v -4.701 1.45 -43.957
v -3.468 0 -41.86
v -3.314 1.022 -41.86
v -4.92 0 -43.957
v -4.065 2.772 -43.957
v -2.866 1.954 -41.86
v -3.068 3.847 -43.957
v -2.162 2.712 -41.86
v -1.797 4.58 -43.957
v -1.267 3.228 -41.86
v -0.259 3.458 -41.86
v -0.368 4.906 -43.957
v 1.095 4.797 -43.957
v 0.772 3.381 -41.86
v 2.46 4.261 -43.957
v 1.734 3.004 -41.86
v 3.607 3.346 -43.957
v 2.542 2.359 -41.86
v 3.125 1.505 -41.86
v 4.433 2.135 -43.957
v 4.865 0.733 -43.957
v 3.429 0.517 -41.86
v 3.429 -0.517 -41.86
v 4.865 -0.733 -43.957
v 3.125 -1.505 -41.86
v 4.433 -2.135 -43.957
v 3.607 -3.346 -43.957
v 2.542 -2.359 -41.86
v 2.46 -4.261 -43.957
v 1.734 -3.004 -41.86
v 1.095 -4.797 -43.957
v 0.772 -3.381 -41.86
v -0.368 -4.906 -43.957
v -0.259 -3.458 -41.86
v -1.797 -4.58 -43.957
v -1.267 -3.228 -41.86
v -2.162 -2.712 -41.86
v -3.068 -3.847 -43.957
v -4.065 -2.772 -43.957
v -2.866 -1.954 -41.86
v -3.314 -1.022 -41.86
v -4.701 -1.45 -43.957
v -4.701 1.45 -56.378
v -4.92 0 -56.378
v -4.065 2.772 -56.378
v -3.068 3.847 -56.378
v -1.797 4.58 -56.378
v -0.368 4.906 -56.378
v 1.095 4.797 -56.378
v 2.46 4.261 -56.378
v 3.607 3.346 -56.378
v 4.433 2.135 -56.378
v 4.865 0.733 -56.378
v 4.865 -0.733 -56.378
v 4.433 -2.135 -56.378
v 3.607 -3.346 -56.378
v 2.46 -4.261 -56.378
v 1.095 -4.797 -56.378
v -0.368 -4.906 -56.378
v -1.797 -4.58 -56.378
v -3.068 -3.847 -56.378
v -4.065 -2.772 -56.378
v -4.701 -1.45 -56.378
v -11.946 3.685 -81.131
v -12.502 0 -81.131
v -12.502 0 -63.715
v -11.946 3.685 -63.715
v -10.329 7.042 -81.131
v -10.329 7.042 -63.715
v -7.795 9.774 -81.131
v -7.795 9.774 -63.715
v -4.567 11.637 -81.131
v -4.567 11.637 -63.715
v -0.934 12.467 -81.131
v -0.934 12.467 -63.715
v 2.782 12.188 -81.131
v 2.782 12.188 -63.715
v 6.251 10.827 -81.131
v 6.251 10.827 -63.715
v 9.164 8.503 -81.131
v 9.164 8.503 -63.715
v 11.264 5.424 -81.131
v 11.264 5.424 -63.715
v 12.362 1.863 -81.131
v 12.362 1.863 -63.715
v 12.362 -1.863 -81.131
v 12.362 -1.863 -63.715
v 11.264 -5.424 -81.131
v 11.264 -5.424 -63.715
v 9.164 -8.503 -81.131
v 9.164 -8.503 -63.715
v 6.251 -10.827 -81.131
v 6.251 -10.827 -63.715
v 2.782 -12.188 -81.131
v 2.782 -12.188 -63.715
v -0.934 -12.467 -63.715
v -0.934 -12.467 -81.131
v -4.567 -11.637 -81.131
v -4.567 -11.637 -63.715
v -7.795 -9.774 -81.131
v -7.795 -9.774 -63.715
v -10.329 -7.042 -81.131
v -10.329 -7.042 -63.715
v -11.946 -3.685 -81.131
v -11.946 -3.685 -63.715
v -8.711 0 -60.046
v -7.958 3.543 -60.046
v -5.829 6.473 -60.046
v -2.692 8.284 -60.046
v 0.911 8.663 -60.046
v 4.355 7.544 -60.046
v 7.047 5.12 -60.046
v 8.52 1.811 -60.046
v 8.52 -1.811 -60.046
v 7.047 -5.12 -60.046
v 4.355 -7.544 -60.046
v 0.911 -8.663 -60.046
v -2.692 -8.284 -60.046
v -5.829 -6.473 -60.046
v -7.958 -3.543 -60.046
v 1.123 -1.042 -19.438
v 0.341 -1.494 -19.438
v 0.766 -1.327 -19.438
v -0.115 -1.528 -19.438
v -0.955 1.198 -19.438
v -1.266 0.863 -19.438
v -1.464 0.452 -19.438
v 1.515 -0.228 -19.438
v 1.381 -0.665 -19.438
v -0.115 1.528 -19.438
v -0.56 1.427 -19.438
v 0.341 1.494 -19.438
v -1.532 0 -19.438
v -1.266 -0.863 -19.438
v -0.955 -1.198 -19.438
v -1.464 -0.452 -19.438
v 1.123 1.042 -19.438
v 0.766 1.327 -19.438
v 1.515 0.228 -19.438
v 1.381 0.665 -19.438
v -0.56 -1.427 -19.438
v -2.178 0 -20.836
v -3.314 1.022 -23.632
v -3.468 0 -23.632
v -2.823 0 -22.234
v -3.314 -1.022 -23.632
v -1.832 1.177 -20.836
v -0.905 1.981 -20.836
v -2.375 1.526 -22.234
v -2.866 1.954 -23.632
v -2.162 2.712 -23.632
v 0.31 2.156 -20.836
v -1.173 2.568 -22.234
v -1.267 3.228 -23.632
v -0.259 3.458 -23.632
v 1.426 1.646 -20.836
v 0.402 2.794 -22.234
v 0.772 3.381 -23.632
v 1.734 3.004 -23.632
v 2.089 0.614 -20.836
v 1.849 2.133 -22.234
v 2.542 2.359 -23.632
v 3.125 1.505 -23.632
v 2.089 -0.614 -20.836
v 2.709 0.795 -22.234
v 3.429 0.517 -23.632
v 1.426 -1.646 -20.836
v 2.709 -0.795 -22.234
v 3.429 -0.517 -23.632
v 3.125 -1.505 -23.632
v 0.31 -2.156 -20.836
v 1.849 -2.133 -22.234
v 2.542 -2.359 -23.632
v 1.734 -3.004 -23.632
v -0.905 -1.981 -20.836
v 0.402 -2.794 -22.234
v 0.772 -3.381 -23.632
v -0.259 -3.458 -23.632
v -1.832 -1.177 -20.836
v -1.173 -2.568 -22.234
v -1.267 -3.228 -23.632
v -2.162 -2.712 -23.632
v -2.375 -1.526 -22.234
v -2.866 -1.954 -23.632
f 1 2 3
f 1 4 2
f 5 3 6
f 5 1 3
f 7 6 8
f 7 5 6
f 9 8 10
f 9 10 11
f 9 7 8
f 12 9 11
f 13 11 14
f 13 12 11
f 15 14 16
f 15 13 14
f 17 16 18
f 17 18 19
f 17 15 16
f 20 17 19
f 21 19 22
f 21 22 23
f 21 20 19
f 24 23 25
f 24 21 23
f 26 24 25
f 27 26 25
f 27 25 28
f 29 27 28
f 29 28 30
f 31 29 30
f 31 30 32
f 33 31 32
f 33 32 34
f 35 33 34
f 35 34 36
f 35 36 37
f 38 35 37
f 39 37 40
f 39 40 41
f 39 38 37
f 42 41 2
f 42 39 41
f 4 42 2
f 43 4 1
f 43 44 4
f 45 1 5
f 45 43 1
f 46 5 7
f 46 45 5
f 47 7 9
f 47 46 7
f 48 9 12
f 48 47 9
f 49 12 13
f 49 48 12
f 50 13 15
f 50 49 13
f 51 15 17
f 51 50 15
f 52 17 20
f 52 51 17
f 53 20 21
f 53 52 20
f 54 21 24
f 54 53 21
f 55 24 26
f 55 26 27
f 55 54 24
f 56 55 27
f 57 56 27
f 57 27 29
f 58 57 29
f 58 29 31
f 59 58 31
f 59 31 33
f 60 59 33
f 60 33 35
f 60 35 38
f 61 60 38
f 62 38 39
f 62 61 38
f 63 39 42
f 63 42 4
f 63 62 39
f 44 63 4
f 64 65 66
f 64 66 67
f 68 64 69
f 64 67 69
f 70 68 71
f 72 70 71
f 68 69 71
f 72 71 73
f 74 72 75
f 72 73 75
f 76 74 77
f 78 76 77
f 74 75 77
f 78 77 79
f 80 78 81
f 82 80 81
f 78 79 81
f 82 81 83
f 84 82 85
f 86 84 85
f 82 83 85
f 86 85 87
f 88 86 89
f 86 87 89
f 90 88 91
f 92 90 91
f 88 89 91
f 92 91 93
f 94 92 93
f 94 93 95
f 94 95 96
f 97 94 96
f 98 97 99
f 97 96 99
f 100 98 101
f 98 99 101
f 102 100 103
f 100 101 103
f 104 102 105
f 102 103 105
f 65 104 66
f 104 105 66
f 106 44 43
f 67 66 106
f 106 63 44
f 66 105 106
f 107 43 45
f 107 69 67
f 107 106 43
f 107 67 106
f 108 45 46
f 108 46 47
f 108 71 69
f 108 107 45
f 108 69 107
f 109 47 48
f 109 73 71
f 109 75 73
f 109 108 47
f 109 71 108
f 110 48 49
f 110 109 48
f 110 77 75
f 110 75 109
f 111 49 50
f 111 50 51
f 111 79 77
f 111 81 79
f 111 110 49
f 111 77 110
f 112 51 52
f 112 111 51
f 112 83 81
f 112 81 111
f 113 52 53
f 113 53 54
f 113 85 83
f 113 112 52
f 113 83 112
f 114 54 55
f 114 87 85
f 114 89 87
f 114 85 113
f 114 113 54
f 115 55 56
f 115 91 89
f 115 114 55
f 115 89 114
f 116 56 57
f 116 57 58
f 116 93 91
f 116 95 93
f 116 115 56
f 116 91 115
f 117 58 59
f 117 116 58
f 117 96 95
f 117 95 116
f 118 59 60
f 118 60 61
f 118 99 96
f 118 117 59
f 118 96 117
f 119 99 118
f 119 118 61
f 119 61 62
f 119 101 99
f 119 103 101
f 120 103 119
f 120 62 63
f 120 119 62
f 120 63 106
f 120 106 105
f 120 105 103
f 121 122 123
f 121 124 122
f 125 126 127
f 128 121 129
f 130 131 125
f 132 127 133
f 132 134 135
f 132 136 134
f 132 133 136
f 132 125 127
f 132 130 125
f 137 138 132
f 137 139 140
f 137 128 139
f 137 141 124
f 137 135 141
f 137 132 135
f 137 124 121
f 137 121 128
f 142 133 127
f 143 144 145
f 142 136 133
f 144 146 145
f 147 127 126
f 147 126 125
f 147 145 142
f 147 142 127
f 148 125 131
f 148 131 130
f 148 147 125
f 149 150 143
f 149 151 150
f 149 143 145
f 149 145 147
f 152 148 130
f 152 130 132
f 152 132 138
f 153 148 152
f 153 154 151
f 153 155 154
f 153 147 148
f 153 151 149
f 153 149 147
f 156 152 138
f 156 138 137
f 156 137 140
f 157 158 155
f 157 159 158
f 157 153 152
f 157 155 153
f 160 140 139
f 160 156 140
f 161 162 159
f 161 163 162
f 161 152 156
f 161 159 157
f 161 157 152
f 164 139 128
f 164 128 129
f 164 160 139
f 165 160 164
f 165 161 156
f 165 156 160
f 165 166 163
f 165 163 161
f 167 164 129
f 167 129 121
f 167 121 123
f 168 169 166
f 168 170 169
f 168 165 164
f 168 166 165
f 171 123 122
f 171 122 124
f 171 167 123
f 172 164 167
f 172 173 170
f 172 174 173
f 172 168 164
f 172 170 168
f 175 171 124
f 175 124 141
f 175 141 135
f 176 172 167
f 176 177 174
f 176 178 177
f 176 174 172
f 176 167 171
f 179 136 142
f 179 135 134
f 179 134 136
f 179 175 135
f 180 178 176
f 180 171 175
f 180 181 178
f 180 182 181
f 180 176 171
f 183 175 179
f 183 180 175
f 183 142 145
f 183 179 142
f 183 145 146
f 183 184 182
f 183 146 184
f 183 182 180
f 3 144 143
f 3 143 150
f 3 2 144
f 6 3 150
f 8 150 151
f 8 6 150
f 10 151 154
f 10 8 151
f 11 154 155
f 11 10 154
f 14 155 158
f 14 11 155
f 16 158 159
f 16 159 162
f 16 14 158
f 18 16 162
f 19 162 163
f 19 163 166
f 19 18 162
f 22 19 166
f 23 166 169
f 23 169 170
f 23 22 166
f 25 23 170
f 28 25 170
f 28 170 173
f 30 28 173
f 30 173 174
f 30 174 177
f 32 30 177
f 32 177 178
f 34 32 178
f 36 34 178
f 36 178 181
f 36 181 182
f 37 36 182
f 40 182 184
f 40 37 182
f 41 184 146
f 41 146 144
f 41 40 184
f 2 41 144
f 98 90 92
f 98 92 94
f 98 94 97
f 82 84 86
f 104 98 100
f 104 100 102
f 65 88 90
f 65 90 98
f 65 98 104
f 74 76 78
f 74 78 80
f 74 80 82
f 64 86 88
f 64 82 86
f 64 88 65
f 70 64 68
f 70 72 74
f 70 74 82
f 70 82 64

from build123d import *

# Parameters (mm, degrees)
F0_W = 12.5015752
F0_H = 17.4159876299


with BuildPart() as f1:
    # F0 (on Front) → F1 (revolve)
    with BuildSketch(Plane.XZ):
        with Locations((-6.2507876, -72.4229157223)):
            Rectangle(F0_W, F0_H)
        Polygon((-12.5015752, -63.7149219074), (0, -63.7149219074), (0, -19.4379147142), (-1.5324499691, -19.4379147142), (-3.4681754187, -23.6319862306), (-3.4681754187, -41.8600700796), (-4.9199699424, -43.9571067691), (-4.9199699424, -56.3780143857), align=None)
    revolve(axis=Axis((0, 0, -47.0220060088), (0, 0, -1)))


solid = f1.part
